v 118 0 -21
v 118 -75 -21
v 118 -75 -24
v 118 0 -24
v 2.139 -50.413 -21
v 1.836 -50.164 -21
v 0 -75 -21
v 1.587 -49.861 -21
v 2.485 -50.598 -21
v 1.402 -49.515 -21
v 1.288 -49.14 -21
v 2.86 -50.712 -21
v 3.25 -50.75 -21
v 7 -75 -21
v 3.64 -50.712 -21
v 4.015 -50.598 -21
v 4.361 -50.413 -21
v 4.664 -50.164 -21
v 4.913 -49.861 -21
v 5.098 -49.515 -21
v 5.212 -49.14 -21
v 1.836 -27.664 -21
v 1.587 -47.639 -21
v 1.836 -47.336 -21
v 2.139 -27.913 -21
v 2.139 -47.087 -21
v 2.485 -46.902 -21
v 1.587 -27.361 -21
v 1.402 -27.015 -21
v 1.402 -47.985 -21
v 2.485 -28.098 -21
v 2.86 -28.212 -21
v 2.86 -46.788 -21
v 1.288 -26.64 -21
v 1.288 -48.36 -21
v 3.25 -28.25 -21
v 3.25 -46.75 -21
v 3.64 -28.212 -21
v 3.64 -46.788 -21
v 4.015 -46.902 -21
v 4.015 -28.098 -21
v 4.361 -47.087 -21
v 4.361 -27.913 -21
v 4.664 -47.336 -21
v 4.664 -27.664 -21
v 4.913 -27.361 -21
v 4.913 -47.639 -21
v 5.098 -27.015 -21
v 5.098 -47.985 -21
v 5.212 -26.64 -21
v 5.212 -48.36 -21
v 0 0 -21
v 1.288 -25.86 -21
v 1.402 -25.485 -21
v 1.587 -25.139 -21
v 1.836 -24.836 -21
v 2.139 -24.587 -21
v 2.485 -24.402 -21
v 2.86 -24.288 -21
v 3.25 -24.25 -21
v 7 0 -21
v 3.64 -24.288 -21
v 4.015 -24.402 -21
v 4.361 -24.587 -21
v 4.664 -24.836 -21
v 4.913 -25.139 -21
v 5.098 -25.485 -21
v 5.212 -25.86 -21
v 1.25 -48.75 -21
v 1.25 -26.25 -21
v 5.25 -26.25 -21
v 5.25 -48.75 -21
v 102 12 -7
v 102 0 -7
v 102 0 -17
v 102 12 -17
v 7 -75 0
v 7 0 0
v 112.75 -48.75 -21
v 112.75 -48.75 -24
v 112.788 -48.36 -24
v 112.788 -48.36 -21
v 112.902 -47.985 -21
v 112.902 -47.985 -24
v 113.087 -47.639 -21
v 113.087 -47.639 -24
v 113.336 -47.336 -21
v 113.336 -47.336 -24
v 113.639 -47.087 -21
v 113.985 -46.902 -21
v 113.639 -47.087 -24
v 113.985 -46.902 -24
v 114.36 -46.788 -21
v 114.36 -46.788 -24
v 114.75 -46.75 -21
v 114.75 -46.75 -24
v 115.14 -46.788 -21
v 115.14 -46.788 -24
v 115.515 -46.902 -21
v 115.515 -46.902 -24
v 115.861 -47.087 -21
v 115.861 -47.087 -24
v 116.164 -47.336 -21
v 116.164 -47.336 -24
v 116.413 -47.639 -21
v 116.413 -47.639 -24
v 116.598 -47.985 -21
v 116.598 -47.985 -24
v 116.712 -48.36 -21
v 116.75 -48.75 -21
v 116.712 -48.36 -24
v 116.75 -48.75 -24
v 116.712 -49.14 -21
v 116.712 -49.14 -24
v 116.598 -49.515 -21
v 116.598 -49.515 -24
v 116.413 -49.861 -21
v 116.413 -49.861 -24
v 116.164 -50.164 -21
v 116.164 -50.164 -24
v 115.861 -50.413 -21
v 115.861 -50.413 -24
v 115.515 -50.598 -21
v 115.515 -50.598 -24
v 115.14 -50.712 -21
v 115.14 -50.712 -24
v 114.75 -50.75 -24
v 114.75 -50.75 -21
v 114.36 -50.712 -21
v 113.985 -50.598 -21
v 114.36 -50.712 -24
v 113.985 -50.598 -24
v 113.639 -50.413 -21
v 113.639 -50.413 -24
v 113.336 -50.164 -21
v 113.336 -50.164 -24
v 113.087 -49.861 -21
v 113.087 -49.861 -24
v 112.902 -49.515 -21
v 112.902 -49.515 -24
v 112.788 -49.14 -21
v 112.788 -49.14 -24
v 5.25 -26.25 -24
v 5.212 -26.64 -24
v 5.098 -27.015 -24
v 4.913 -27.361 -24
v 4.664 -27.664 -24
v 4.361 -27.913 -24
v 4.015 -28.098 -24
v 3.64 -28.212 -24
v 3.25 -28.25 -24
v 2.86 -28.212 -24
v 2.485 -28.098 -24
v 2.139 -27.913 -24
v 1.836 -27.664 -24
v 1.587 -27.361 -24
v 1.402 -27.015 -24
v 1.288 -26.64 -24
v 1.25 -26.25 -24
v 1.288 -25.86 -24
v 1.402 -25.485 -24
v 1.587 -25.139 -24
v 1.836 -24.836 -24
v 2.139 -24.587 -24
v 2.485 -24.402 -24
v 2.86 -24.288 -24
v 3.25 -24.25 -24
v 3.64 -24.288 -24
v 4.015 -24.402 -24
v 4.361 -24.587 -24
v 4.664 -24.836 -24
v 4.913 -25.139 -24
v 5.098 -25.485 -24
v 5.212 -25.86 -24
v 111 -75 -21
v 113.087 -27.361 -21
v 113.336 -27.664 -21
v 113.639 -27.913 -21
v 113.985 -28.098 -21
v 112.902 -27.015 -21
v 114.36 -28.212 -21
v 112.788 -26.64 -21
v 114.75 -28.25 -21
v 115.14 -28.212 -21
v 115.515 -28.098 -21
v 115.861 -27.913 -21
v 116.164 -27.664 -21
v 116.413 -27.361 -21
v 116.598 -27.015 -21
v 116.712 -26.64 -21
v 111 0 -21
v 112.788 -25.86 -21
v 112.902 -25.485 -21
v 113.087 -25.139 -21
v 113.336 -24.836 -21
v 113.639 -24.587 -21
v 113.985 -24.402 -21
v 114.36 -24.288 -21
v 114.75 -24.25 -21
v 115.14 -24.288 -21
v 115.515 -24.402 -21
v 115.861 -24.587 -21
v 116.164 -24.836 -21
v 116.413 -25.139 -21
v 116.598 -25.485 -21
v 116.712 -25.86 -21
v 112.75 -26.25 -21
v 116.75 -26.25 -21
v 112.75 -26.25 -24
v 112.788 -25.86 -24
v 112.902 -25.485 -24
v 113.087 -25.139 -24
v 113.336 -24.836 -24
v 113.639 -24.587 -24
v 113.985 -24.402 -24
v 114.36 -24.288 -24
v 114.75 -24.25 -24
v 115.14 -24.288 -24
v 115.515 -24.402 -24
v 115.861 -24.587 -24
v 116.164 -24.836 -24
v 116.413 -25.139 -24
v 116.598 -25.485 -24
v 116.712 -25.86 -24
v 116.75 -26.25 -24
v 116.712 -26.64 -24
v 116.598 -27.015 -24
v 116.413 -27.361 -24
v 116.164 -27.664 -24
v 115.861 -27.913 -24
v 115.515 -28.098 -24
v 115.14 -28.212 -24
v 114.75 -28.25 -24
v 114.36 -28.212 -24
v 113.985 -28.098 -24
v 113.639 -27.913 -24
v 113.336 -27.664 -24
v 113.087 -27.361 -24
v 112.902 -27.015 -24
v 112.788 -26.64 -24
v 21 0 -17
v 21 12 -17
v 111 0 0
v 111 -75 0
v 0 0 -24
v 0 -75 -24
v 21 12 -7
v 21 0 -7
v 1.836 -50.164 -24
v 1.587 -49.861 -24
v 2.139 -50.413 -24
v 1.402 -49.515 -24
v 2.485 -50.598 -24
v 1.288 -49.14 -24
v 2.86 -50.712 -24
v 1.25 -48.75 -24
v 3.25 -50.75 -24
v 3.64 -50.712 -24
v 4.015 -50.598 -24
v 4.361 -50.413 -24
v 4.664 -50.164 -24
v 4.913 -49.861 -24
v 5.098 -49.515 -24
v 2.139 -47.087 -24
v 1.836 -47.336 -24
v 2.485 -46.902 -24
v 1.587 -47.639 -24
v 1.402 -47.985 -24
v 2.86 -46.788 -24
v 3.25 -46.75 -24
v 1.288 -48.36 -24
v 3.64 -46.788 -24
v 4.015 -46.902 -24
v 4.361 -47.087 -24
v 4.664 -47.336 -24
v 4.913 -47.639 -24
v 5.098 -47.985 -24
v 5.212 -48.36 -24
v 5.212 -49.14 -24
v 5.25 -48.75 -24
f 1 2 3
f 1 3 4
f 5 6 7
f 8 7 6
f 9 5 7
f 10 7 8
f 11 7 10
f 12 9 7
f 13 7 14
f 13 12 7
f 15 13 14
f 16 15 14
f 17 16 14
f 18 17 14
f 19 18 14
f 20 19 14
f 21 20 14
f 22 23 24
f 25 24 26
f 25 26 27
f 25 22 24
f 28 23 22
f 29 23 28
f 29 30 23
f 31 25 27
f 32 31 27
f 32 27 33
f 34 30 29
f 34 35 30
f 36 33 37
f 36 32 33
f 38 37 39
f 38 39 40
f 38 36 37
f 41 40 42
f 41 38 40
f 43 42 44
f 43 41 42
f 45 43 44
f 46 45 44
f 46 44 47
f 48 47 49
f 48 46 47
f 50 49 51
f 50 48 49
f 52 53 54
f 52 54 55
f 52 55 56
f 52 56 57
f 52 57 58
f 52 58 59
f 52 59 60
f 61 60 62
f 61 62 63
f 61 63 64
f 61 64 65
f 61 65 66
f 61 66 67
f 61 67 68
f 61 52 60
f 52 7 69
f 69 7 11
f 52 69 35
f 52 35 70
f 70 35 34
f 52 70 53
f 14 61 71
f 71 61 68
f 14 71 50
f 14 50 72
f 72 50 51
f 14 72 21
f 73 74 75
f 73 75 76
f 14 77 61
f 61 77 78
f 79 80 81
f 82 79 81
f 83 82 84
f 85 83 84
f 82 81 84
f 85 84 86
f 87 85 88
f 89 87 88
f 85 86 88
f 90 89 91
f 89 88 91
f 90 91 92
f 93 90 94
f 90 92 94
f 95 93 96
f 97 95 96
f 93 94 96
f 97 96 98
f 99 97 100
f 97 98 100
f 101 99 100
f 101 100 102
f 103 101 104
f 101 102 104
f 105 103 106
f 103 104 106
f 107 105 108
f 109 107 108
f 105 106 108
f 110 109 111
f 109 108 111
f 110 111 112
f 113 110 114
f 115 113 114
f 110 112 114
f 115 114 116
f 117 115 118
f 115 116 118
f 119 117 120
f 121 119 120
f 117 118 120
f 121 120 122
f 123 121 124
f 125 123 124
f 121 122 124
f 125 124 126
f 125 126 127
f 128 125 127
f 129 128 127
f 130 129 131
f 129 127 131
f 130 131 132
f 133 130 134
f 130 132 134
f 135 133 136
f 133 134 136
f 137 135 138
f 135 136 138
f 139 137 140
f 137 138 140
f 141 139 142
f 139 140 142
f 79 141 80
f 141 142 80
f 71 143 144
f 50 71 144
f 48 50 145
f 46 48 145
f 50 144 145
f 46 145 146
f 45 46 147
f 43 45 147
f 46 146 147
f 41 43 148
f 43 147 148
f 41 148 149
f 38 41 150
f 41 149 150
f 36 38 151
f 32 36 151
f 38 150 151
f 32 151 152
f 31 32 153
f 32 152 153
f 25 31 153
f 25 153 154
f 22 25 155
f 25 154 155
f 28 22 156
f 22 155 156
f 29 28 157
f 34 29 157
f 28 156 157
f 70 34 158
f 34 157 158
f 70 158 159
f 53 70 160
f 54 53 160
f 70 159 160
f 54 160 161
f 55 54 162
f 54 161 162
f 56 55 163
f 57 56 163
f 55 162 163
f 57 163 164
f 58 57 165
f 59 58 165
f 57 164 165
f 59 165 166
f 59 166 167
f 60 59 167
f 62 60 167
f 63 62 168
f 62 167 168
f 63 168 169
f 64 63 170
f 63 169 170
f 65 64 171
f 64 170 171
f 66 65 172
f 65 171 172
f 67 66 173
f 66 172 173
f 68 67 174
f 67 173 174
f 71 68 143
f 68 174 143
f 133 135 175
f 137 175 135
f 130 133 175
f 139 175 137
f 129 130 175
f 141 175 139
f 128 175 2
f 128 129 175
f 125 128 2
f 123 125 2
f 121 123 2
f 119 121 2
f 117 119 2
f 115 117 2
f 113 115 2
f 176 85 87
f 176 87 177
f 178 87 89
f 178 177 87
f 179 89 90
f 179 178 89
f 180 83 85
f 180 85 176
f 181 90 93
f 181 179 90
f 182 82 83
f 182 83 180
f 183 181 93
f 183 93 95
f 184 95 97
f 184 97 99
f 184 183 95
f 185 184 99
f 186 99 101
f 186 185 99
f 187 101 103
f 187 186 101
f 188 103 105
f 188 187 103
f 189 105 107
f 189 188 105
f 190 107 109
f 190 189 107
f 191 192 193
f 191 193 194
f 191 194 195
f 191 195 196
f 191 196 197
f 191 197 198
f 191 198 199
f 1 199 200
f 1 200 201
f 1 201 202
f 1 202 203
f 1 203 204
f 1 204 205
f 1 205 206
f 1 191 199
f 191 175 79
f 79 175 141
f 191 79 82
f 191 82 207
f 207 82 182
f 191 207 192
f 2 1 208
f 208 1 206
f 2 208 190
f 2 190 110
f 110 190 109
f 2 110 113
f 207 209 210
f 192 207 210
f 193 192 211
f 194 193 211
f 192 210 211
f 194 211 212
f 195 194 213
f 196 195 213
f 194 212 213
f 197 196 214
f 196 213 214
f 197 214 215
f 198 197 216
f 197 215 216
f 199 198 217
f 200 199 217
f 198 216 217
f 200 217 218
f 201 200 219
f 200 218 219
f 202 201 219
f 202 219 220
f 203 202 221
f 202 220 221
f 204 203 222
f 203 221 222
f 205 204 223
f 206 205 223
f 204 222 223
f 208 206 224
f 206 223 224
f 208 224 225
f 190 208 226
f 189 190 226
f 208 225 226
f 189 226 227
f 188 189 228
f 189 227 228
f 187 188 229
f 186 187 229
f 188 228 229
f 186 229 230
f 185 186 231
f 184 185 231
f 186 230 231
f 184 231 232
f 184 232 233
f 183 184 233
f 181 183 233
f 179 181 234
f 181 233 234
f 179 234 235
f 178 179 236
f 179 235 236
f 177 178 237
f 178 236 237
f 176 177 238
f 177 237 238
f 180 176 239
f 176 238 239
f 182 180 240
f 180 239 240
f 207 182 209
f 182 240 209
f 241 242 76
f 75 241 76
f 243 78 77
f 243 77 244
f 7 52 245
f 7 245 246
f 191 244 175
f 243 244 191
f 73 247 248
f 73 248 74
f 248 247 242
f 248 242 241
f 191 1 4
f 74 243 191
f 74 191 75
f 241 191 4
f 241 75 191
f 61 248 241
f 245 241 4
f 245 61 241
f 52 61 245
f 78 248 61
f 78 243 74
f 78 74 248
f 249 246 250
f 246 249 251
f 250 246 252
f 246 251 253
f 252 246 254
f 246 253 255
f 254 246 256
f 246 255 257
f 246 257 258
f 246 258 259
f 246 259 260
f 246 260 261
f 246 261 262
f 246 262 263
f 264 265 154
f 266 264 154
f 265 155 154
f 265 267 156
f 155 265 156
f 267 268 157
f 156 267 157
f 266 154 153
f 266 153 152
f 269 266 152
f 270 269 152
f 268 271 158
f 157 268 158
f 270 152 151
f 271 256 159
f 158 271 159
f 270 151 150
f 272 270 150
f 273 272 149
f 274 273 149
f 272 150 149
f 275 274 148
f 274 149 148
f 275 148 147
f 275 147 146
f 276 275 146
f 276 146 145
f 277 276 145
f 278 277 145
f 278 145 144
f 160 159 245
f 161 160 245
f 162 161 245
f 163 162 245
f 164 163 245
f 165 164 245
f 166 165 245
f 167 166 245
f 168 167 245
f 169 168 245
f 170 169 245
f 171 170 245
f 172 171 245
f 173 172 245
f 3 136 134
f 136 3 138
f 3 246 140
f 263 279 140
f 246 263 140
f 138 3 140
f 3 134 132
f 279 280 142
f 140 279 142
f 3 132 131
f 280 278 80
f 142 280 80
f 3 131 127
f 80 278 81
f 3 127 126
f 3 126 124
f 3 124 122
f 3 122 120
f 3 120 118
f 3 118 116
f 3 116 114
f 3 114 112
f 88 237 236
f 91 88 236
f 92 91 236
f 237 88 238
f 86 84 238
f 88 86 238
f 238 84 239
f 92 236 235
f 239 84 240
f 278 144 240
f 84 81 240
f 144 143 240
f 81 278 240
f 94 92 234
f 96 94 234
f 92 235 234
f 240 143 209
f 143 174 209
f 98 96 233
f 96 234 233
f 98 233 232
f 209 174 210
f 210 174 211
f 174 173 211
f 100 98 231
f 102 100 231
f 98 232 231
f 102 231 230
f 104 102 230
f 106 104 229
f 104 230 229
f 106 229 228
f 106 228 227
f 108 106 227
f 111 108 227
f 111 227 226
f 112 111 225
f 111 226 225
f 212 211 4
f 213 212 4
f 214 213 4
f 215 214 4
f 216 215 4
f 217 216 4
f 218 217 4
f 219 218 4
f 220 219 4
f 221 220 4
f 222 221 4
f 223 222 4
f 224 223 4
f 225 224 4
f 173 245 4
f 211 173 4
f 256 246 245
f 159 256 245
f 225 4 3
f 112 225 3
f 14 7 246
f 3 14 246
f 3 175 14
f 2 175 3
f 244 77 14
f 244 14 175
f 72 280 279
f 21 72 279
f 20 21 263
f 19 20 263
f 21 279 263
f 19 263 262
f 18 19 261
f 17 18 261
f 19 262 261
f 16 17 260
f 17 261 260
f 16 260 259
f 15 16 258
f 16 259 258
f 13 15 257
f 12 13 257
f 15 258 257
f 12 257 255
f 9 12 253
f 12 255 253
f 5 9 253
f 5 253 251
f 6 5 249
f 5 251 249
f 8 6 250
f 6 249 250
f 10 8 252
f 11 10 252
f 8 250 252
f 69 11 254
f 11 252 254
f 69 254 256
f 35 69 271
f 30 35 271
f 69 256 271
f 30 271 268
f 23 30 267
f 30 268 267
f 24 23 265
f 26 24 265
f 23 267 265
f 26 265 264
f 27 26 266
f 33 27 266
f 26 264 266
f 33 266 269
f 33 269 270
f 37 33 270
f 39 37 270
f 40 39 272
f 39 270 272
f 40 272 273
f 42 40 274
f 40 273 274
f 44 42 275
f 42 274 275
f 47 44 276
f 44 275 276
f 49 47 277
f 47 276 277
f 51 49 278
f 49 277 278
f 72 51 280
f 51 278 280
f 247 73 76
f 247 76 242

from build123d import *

# Parameters (mm, degrees)
BOSS_EXTRUDE1_DEPTH = 24
SKETCH3_W           = 7
SKETCH3_H           = 75
CUT_EXTRUDE1_DEPTH  = 21
SKETCH4_W           = 81
SKETCH4_H           = 12
CUT_EXTRUDE2_DEPTH  = 7
SKETCH5_R           = 2
CUT_EXTRUDE3_DEPTH  = 3


with BuildPart() as part:
    # Sketch2 → Boss-Extrude1 (new body)
    with BuildSketch(Plane.XY):
        Polygon((0, 0), (0, -75), (118, -75), (118, 0), (102, 0), (102, 12), (21, 12), (21, 0), align=None)
    extrude(amount=-BOSS_EXTRUDE1_DEPTH)

    # Sketch3 → Cut-Extrude1 (cut)
    with BuildSketch(Plane.XY):
        with Locations((3.5, -37.5)):
            Rectangle(SKETCH3_W, SKETCH3_H)
        with Locations((114.5, -37.5)):
            Rectangle(SKETCH3_W, SKETCH3_H)
    extrude(amount=-CUT_EXTRUDE1_DEPTH, mode=Mode.SUBTRACT)

    # Sketch4 → Cut-Extrude2 (cut)
    with BuildSketch(Plane.XY):
        with Locations((61.5, 6)):
            Rectangle(SKETCH4_W, SKETCH4_H)
    cut_extrude2 = extrude(amount=-CUT_EXTRUDE2_DEPTH, mode=Mode.SUBTRACT)

    # Mirror1: Cut-Extrude2 across plane
    add(cut_extrude2.mirror(Plane.XY.offset(-12)), mode=Mode.SUBTRACT)

    # Sketch5 → Cut-Extrude3 (cut)
    with BuildSketch(Plane(origin=(0, 0, -24), x_dir=(-1, 0, 0), z_dir=(0, 0, -1))):
        with Locations((-114.75, -26.25)):
            Circle(SKETCH5_R)
        with Locations((-114.75, -48.75)):
            Circle(SKETCH5_R)
        with Locations(Location((-3.25, -48.75, 0), (0, 0, 180))):
            Circle(SKETCH5_R)
        with Locations(Location((-3.25, -26.25, 0), (0, 0, 180))):
            Circle(SKETCH5_R)
    extrude(amount=-CUT_EXTRUDE3_DEPTH, mode=Mode.SUBTRACT)


solid = part.part
